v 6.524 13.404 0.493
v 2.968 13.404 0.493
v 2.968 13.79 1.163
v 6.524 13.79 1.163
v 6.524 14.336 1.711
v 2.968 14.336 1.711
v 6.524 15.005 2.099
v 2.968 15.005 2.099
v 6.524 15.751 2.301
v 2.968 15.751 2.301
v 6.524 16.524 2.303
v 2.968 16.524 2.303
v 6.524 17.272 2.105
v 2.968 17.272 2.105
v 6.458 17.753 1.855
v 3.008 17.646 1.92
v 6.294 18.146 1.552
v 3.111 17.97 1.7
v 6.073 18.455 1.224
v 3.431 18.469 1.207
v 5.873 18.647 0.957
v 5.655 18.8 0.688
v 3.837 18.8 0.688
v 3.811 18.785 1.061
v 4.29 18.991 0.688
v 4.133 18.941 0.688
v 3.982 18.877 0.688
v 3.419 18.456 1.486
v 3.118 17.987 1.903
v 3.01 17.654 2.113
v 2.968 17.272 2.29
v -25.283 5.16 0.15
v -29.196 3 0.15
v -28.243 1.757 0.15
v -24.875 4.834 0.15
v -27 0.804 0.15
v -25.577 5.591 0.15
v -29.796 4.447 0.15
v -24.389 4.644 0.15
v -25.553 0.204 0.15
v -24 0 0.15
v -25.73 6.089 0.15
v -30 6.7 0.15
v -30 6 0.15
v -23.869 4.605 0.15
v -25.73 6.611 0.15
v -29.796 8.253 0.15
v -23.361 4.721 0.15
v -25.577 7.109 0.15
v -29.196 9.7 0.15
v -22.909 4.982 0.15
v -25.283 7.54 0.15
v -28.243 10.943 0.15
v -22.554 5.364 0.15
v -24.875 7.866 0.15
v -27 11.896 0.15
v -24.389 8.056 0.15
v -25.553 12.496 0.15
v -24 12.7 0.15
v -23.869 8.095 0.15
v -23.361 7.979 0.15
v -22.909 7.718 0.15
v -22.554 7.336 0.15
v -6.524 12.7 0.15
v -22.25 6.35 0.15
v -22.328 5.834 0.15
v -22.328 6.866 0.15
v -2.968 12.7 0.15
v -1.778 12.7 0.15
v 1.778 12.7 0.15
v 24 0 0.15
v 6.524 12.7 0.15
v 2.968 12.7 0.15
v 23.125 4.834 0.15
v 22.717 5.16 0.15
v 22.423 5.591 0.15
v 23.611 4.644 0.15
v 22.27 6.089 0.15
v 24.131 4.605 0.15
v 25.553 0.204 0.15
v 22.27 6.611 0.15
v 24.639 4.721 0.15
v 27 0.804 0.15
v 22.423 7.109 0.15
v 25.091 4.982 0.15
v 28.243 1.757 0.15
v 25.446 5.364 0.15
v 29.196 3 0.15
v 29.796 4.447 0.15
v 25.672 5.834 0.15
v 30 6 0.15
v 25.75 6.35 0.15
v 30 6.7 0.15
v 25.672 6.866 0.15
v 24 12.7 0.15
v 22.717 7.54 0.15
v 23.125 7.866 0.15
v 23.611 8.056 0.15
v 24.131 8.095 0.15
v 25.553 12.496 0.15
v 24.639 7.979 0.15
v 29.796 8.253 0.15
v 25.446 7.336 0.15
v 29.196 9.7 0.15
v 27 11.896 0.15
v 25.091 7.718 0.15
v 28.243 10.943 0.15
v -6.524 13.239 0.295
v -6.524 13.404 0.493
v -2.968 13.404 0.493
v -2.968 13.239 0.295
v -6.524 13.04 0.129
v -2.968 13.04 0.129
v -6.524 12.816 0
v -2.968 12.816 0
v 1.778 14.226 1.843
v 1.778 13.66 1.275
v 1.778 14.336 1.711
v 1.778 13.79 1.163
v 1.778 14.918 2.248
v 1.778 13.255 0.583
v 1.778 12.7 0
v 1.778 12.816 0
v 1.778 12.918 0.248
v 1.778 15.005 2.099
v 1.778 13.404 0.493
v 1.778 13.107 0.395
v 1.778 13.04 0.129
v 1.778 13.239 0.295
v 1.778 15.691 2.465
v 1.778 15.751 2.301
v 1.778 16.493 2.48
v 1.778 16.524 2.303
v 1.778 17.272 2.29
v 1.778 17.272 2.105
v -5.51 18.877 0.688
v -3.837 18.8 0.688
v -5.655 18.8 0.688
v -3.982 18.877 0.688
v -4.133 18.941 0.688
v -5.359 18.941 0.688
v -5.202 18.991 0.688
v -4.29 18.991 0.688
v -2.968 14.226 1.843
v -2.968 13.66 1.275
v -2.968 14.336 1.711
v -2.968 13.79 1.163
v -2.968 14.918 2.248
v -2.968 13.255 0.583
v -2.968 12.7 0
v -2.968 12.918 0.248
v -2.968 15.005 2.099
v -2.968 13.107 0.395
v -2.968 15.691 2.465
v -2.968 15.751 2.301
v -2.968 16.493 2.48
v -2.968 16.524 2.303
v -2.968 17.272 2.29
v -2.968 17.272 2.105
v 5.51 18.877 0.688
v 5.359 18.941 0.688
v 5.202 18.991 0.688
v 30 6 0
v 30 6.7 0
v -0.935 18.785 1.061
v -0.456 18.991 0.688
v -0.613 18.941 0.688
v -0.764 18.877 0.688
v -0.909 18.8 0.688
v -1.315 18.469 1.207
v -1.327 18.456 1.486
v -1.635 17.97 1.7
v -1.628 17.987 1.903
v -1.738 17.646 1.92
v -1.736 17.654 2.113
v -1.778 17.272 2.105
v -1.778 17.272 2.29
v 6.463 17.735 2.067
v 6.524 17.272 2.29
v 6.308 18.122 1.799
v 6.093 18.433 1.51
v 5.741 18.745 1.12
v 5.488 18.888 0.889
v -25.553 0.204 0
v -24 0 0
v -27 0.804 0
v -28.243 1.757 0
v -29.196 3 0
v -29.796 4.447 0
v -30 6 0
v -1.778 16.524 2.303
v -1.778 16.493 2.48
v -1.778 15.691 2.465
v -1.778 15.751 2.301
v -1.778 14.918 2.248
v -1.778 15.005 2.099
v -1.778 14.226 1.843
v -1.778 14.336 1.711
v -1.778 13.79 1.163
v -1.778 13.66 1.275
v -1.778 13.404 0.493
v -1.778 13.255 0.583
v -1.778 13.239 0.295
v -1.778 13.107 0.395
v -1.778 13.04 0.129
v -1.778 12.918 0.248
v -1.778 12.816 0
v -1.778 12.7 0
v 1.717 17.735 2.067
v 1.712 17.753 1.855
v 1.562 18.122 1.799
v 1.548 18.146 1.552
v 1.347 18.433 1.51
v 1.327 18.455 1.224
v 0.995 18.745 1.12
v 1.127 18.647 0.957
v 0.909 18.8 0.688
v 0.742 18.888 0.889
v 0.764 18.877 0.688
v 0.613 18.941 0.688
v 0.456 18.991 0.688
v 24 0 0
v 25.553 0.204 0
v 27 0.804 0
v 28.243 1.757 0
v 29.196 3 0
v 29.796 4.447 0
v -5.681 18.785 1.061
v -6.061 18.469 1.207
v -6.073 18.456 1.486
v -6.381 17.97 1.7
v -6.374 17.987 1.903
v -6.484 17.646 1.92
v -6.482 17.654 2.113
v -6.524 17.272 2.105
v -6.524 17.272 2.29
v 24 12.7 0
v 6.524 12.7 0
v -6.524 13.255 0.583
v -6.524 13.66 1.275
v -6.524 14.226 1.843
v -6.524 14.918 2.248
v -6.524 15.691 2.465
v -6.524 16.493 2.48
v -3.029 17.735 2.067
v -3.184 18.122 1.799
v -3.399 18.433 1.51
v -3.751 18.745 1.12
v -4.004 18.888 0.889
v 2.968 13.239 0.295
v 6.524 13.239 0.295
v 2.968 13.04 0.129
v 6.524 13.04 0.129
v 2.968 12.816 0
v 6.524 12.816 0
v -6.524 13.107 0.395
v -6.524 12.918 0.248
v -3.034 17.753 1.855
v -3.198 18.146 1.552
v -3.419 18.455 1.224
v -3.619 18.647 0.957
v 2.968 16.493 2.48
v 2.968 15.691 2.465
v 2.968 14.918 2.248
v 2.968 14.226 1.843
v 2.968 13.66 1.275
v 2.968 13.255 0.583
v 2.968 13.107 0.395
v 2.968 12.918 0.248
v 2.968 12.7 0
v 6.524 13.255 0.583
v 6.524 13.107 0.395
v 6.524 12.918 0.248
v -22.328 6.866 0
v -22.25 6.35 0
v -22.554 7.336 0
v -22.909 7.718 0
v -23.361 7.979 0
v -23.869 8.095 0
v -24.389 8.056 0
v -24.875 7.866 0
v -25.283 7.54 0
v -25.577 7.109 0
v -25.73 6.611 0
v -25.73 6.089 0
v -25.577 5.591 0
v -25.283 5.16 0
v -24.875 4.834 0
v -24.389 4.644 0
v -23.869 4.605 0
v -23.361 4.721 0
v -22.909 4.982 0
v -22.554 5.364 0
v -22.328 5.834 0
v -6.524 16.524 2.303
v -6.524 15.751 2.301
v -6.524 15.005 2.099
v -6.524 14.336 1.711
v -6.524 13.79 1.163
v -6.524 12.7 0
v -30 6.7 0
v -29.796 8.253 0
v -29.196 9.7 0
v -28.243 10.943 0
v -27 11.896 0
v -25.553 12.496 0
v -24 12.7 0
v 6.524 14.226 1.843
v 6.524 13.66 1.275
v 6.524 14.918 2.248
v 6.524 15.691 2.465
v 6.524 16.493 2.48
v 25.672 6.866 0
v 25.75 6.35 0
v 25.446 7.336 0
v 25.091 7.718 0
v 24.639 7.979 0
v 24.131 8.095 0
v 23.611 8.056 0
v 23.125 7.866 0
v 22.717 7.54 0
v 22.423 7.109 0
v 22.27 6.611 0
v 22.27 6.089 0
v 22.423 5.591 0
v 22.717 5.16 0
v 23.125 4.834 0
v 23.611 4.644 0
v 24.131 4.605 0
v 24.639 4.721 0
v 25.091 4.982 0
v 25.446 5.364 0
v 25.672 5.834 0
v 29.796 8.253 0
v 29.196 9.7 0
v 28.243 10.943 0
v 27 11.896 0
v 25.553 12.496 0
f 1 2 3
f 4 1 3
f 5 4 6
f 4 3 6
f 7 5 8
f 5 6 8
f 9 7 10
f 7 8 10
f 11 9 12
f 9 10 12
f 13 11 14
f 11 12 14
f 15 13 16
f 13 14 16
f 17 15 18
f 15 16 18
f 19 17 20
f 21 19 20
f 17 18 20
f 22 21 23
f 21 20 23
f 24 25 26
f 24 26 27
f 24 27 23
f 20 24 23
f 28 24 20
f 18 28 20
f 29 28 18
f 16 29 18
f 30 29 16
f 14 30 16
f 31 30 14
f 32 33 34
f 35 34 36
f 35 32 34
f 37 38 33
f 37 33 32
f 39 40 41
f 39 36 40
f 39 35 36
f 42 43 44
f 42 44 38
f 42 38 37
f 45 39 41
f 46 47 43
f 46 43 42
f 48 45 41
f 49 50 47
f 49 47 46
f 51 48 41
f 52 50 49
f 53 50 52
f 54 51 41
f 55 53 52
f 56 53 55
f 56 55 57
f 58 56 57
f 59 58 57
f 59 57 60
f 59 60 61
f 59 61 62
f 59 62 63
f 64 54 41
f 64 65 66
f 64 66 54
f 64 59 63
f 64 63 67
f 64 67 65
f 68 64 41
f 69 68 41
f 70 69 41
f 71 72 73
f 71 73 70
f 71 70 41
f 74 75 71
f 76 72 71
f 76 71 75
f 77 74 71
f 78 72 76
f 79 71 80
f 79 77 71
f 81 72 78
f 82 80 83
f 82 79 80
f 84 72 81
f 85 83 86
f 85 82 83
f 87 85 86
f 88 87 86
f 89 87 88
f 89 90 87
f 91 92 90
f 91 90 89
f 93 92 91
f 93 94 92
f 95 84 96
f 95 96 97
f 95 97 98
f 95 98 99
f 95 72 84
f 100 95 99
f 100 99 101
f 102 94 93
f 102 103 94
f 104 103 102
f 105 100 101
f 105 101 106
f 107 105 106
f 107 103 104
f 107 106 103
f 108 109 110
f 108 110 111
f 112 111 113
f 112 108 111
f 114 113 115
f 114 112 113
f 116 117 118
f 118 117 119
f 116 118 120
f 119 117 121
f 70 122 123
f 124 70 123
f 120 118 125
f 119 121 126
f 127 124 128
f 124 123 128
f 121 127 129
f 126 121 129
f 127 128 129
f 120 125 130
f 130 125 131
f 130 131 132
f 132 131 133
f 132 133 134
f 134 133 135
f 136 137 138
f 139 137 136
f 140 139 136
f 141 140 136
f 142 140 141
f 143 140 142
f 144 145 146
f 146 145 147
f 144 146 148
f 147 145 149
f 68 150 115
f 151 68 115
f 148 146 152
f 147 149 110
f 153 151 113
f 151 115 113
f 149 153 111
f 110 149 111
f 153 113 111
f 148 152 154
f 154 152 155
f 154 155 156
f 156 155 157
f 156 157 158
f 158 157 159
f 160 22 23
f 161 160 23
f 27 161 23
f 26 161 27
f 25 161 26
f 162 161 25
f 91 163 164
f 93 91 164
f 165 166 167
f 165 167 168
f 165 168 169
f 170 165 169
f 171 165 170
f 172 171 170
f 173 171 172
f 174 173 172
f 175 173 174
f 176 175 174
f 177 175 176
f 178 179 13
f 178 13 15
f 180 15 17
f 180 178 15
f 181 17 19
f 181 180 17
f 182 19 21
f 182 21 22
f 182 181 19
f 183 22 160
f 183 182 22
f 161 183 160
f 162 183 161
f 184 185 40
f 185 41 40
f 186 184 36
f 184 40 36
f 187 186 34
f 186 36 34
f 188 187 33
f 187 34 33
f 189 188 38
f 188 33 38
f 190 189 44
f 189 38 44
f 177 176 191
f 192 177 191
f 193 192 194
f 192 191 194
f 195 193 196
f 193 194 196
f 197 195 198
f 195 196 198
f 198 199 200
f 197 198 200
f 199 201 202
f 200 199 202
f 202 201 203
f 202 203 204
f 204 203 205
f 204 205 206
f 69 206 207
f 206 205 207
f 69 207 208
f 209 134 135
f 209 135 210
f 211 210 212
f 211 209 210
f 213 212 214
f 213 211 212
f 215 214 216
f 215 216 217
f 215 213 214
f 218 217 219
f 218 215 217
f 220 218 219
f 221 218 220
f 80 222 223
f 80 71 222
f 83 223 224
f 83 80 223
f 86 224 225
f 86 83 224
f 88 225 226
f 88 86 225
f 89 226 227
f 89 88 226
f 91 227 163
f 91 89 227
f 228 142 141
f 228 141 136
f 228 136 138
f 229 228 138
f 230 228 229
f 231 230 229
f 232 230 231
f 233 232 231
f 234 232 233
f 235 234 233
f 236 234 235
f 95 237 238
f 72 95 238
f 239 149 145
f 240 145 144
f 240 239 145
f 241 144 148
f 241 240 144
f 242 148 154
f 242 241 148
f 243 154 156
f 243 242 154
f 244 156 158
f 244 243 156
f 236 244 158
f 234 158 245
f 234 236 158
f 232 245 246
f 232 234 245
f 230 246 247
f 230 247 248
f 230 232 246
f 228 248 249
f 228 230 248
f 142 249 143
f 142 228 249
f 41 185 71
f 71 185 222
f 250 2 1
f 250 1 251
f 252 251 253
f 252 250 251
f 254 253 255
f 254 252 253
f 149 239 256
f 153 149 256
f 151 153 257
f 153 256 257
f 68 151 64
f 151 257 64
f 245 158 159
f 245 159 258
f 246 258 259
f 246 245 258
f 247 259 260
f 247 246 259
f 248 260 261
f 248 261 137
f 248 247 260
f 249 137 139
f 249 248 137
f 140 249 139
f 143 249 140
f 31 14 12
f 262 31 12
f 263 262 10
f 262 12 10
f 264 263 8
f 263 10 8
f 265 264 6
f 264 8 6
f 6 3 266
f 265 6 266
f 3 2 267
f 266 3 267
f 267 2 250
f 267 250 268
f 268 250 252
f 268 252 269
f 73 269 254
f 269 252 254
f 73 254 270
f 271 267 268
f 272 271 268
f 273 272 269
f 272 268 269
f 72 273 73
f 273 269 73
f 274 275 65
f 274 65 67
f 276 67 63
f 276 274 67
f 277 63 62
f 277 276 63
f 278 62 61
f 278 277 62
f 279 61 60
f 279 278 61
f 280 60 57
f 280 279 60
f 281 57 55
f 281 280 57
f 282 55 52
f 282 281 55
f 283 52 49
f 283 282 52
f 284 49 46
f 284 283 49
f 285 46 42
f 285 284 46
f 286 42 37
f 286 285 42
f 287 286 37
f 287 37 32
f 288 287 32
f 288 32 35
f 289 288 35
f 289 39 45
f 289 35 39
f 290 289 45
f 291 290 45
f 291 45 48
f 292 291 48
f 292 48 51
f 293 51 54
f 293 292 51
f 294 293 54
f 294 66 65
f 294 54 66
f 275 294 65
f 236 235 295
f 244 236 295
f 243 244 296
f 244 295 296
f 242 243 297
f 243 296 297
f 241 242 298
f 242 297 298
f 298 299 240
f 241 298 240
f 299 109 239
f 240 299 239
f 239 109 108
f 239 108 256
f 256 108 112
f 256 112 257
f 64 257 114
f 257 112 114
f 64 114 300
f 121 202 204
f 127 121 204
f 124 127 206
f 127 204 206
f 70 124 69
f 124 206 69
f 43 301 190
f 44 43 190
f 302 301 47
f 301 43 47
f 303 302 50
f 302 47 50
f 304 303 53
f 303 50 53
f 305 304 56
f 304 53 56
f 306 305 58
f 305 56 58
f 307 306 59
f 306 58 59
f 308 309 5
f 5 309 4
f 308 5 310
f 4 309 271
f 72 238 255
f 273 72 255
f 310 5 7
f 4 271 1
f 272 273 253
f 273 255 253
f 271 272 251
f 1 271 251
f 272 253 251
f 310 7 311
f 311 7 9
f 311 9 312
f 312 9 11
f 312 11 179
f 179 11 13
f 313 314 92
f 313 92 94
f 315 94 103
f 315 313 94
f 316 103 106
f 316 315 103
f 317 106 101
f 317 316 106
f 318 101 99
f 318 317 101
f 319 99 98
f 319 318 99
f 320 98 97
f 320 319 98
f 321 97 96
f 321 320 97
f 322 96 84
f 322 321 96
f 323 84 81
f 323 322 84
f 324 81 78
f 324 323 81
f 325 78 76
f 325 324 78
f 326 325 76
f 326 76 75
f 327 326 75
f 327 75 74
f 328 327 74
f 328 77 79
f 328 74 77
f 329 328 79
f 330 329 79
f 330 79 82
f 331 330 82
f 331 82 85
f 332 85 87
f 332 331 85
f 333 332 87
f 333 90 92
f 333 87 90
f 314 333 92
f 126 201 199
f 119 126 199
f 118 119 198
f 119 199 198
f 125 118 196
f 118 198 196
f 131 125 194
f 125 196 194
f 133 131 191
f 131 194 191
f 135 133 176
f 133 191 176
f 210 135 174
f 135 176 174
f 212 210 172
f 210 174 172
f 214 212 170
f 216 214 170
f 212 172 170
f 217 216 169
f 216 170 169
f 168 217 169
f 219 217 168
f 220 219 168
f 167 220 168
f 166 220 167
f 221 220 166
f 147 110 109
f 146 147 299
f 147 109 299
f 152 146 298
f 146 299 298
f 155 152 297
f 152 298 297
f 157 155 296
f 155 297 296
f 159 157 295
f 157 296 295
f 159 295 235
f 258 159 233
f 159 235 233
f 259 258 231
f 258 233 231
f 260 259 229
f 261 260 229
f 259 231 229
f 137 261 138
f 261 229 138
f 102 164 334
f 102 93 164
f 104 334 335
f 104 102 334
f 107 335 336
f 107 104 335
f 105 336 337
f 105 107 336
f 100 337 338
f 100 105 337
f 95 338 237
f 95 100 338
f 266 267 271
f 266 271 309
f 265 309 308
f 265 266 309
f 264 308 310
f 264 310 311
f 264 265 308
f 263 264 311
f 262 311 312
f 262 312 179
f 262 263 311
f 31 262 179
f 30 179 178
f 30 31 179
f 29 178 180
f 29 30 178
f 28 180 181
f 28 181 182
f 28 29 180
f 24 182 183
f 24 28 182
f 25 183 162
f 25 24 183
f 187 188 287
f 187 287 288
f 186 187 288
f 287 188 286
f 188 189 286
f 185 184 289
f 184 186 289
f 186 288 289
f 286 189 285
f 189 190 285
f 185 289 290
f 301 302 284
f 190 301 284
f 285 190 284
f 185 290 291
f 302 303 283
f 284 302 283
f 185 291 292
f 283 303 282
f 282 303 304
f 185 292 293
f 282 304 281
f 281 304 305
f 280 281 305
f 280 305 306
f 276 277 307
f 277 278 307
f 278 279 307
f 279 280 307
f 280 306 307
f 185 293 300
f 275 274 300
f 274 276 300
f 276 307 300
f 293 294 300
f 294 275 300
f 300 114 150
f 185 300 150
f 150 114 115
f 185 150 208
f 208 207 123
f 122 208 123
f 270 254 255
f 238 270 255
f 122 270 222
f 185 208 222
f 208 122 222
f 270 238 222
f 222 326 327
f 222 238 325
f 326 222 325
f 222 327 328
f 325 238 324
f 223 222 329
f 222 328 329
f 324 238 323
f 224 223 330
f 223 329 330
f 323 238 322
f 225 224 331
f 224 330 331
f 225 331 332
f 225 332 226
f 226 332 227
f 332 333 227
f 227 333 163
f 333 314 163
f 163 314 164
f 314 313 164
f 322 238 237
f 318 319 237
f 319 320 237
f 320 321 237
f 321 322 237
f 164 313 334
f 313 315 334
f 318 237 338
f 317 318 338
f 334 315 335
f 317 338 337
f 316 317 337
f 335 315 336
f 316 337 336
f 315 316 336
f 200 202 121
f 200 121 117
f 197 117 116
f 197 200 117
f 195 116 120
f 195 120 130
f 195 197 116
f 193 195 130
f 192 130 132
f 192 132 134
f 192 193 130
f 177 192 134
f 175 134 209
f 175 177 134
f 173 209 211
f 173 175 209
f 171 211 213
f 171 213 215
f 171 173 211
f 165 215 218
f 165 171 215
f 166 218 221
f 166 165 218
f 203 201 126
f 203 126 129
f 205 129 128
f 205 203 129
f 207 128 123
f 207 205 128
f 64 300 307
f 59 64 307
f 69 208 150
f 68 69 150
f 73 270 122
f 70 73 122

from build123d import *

# Parameters (mm, degrees)
SKETCH_R        = 1.75
PAD_DEPTH       = 3.05
SKETCH001_W     = 60.21645
SKETCH001_H     = 13.401505
POCKET_DEPTH    = 2.9
POCKET001_DEPTH = 3.051
POCKET002_DEPTH = 36.525
FILLET_R        = 6


with BuildPart() as part:
    # Sketch → Pad (new body)
    with BuildSketch(Plane.XY):
        Polygon((-30, 0), (30, 0), (30, 12.7), (6.524, 12.7), (6.524, 19.05), (2.968, 19.05), (2.968, 12.7), (1.778, 12.7), (1.778, 19.05), (-1.778, 19.05), (-1.778, 12.7), (-2.968, 12.7), (-2.968, 19.05), (-6.524, 19.05), (-6.524, 12.7), (-30, 12.7), align=None)
        with Locations((-24, 6.35)):
            Circle(SKETCH_R, mode=Mode.SUBTRACT)
        with Locations((24, 6.35)):
            Circle(SKETCH_R, mode=Mode.SUBTRACT)
    extrude(amount=PAD_DEPTH)

    # Sketch001 (on Face20 of Pad) → Pocket (cut)
    with BuildSketch(Plane.XY.offset(3.05)):
        with Locations((-0.108225, 5.999248)):
            Rectangle(SKETCH001_W, SKETCH001_H)
    extrude(amount=-POCKET_DEPTH, mode=Mode.SUBTRACT)

    # Sketch002 (on Face25 of Pocket) → Pocket001 (cut, through all)
    with BuildSketch(Plane.XY.offset(3.05)):
        with BuildLine():
            ThreePointArc((-2.968, 17.272), (-4.746, 19.05), (-6.524, 17.272))
            Line((-6.524, 17.272), (-7.554864, 19.132154))
            Line((-7.554864, 19.132154), (-6.342233, 20.53426))
            Line((-6.342233, 20.53426), (5.632503, 20.53426))
            Line((5.632503, 20.53426), (7.211451, 19.637419))
            Line((6.524, 17.272), (7.211451, 19.637419))
            ThreePointArc((6.524, 17.272), (4.746, 19.05), (2.968, 17.272))
            Line((2.968, 17.272), (1.778, 17.272))
            ThreePointArc((1.778, 17.272), (0, 19.05), (-1.778, 17.272))
            Line((-1.778, 17.272), (-2.968, 17.272))
        make_face()
    extrude(amount=-POCKET001_DEPTH, mode=Mode.SUBTRACT)

    # Sketch003 (on Face7 of Pocket001) → Pocket002 (cut, through all)
    with BuildSketch(Plane(origin=(-6.524, 0, 0), x_dir=(0, -1, 0), z_dir=(-1, 0, 0))):
        with BuildLine():
            Line((-12.816161, 0), (-12.862388, -0.39199))
            Line((-12.862388, -0.39199), (-19.923561, -0.39199))
            Line((-19.923561, -0.39199), (-19.923561, 4.294415))
            Line((-19.923561, 4.294415), (-11.624612, 3.801784))
            Line((-11.624612, 3.801784), (-12.7, 0.15))
            ThreePointArc((-13.25543, 0.582616), (-13.017245, 0.315556), (-12.7, 0.15))
            ThreePointArc((-13.25543, 0.582616), (-16.088623, 2.498132), (-18.990517, 0.68838))
            Line((-18.799929, 0.68838), (-18.990517, 0.68838))
            ThreePointArc((-13.404078, 0.493377), (-16.039328, 2.325158), (-18.799929, 0.68838))
            ThreePointArc((-13.404078, 0.493377), (-13.14319, 0.207281), (-12.816161, 0))
        make_face()
    extrude(amount=-POCKET002_DEPTH, mode=Mode.SUBTRACT)

    # Fillet
    fillet_edges = [part.edges().sort_by_distance(p)[0] for p in [
        (30, 0, 0.075),
        (30, 12.7, 0.075),
        (-30, 12.7, 0.075),
        (-30, 0, 0.075),
    ]]
    fillet(fillet_edges, radius=FILLET_R)


solid = part.part
